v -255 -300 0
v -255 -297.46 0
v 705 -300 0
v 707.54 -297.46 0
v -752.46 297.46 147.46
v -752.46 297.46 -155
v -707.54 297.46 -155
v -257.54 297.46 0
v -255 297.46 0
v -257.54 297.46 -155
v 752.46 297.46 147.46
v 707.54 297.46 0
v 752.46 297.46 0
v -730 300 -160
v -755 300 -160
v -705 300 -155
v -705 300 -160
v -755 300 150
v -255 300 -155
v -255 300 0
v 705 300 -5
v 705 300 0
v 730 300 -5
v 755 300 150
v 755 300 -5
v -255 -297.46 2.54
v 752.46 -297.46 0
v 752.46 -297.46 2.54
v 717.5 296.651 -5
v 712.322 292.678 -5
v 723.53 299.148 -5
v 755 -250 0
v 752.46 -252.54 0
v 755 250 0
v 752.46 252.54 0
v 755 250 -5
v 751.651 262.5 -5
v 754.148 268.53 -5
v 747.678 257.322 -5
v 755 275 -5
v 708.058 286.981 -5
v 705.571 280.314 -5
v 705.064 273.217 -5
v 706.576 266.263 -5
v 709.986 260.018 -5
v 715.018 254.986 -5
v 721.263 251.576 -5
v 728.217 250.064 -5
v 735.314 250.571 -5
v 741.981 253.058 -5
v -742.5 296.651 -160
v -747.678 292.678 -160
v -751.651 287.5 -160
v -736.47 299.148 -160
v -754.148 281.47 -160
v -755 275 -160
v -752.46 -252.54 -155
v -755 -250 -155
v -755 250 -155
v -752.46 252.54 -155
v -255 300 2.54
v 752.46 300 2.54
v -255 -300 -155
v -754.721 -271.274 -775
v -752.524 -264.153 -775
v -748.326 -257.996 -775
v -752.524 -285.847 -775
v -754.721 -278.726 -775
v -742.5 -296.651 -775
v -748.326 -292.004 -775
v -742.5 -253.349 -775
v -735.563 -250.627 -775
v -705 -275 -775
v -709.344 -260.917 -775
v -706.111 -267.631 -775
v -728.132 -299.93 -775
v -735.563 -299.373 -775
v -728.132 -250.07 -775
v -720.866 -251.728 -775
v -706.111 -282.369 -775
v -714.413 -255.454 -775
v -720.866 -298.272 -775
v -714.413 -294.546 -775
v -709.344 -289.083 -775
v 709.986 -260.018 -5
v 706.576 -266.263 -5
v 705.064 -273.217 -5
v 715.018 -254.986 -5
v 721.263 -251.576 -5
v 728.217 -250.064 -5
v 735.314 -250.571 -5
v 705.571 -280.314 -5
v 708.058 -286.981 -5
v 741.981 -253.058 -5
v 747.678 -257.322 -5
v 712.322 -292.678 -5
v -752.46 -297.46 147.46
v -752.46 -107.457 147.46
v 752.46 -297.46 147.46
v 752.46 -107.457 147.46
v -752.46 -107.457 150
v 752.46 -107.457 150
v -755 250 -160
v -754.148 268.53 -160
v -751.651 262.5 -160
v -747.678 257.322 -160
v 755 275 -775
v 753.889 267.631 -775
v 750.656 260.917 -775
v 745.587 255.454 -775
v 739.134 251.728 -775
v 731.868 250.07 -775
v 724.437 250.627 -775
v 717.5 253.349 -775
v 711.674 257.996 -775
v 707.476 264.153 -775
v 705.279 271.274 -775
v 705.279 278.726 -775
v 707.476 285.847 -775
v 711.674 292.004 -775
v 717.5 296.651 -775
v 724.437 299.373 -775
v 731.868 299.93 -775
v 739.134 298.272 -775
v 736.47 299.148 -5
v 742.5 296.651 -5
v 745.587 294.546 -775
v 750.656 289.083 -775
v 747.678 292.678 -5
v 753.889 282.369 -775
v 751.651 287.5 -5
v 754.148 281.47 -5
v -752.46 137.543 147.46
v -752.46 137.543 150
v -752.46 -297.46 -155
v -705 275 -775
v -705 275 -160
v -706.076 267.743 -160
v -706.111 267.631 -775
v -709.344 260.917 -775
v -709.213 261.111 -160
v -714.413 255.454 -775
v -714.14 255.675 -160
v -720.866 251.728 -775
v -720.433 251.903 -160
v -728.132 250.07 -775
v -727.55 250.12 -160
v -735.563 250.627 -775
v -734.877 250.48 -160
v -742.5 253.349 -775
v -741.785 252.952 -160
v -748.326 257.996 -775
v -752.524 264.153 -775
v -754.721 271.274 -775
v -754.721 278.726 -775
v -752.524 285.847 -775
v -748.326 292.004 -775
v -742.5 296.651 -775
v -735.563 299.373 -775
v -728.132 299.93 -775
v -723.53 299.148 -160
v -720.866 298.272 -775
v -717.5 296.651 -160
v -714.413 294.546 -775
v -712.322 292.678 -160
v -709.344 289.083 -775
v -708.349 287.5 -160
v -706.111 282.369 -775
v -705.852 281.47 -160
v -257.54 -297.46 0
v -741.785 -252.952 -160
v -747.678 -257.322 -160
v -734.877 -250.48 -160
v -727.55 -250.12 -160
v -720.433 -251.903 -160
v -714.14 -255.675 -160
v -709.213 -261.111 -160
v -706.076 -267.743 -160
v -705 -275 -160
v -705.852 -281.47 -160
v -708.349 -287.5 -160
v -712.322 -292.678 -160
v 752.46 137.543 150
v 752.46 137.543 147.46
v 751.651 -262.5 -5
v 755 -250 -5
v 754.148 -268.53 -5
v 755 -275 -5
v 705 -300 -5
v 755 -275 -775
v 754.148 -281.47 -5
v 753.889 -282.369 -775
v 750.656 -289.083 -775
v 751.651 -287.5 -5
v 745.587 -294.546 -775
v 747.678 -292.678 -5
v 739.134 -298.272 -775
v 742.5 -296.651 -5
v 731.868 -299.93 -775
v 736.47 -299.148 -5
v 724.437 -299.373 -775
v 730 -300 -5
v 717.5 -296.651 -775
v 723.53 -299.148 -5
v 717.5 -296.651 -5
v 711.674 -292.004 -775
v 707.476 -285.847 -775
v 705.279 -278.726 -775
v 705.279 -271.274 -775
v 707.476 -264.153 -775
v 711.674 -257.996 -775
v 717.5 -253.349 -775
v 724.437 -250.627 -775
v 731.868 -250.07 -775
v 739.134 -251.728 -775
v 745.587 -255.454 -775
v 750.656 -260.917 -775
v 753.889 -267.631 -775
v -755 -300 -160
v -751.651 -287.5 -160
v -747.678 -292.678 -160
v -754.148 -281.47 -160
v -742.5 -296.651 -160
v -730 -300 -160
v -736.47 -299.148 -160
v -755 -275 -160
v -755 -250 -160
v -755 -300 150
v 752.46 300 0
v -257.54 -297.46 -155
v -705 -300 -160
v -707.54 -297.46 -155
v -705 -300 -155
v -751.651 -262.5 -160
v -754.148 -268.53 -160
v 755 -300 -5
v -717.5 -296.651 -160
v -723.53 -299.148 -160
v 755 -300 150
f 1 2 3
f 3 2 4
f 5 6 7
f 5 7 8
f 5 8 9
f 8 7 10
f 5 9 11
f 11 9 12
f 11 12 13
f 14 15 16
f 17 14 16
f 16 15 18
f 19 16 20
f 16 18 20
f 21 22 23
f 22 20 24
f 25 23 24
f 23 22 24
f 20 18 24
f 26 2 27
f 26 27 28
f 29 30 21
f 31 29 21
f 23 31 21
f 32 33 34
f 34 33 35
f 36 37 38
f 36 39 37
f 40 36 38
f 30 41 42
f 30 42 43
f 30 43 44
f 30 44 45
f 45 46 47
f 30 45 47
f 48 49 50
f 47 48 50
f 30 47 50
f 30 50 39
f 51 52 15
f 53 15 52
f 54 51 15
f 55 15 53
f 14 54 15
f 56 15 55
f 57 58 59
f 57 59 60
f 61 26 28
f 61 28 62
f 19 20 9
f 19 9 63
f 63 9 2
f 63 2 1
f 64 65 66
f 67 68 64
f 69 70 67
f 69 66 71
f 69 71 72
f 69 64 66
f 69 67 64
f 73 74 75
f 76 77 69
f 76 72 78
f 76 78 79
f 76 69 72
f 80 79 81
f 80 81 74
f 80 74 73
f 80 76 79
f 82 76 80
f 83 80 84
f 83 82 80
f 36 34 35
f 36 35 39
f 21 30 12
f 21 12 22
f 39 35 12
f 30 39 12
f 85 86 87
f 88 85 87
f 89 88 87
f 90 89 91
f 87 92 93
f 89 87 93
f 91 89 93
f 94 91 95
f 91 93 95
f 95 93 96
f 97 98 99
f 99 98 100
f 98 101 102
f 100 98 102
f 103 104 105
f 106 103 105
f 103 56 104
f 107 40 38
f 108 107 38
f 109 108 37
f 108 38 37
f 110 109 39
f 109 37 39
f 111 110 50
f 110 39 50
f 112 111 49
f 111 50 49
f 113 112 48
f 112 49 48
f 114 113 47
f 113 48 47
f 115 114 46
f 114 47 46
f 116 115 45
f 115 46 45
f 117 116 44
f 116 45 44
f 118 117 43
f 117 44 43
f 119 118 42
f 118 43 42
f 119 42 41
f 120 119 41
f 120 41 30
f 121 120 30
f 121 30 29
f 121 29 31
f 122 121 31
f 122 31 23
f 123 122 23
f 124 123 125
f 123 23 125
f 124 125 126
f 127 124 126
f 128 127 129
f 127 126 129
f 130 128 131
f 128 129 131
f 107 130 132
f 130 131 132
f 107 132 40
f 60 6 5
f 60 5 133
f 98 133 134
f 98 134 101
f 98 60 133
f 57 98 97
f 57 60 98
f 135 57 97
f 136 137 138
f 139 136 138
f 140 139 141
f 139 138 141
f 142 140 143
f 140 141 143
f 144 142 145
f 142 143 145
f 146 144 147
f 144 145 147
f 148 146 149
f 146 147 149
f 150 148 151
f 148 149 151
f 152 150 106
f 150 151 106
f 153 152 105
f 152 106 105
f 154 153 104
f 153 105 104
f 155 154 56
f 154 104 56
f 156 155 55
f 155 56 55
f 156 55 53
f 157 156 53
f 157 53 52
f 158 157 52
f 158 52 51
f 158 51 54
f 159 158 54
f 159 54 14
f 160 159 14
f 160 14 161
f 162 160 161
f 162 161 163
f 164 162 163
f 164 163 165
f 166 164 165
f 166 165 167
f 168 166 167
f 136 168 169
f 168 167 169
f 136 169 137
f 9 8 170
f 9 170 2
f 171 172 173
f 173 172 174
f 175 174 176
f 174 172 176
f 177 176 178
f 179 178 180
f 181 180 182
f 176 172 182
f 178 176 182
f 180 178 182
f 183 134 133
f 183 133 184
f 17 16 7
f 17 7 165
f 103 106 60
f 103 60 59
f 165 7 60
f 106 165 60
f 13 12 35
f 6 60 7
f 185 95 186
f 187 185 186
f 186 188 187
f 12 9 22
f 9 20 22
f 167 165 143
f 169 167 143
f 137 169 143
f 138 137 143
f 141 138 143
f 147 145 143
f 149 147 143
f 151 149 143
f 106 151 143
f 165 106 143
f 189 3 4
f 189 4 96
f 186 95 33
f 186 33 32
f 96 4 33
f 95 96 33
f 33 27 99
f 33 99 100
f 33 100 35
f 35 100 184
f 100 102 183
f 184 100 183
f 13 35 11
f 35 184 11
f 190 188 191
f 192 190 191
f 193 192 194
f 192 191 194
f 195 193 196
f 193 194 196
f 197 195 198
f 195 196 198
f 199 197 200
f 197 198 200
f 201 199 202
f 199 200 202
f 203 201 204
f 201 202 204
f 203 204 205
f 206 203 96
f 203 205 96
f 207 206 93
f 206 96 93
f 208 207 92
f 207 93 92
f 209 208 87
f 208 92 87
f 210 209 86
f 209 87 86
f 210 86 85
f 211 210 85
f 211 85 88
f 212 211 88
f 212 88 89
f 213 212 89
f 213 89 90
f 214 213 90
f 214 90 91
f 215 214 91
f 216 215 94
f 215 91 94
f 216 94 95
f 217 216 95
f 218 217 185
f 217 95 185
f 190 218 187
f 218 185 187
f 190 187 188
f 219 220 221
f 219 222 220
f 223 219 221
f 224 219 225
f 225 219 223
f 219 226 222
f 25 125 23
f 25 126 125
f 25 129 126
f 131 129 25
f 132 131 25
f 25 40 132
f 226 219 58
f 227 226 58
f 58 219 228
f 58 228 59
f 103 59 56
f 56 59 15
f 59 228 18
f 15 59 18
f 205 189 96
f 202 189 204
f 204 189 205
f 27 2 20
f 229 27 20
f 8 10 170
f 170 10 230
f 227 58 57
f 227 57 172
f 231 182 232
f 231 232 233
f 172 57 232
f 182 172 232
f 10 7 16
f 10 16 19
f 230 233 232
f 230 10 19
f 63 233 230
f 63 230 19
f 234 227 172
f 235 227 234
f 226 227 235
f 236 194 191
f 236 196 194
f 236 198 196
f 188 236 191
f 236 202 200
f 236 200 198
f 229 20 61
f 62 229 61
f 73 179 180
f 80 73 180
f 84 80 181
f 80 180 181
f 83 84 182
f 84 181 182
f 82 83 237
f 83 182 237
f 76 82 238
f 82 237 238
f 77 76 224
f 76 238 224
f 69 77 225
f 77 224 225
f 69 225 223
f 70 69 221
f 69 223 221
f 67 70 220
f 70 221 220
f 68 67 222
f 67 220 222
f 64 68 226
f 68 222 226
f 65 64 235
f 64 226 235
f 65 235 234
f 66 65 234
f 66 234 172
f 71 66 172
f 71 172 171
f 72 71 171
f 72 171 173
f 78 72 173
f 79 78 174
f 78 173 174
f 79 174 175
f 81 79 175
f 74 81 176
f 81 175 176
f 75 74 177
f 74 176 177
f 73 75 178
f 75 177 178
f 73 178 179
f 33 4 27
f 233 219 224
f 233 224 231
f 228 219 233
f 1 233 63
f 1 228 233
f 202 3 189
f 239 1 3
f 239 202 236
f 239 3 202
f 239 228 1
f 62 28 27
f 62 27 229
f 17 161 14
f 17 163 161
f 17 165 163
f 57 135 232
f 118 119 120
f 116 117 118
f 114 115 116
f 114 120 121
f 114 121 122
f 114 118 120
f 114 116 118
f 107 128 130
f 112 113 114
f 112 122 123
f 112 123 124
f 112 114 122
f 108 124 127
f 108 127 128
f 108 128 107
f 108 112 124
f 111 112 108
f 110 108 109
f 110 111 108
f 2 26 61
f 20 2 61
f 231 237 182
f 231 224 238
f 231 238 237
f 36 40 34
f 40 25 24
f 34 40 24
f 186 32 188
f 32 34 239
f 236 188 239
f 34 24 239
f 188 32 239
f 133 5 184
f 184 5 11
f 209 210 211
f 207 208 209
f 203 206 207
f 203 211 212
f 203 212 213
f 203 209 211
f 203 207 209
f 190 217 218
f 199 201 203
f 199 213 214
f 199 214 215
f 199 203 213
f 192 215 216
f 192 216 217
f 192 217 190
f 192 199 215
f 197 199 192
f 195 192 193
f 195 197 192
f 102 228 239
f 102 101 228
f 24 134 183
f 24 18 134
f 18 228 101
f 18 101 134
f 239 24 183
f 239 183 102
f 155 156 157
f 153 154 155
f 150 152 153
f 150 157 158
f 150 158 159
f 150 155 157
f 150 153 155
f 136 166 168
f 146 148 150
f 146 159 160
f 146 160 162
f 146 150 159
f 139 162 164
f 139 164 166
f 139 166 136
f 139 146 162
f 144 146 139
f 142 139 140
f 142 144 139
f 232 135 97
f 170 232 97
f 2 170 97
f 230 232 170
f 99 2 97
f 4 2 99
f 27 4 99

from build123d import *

# Parameters (mm, degrees)
F0_W      = 1510
F0_H      = 600
F1_DEPTH  = 150
F2_T      = -2.54
F3_W      = 500
F3_H      = 600
F4_DEPTH  = 155
F5_W      = 494.92
F5_H      = 594.92
F6_DEPTH  = 302.46
F7_W      = 1504.92
F7_H      = 245
F8_DEPTH  = 25.4
F10_DEPTH = 5
F11_R     = 25
F12_DEPTH = 770
F14_DEPTH = 5
F15_R     = 25
F16_DEPTH = 615
F17_W     = 597.46
F17_H     = 2.54
F18_DEPTH = 1007.46


with BuildPart() as f1:
    # F0 (on Top) → F1 (new body)
    with BuildSketch(Plane.XY):
        Rectangle(F0_W, F0_H)
    extrude(amount=F1_DEPTH)

    # F2
    f2_openings = [f1.faces().sort_by_distance(p)[0] for p in [
        (0, 0, 0),
    ]]
    offset(amount=F2_T, openings=f2_openings)

    # F3 (on face) → F4 (join)
    with BuildSketch(Plane(origin=(0, 0, 0), x_dir=(1, 0, 0), z_dir=(0, 0, -1))):
        with Locations((-505, 0)):
            Rectangle(F3_W, F3_H)
    extrude(amount=F4_DEPTH)

    # F5 (on face) → F6 (cut, through all)
    with BuildSketch(Plane(origin=(0, 0, -155), x_dir=(1, 0, 0), z_dir=(0, 0, -1))):
        with Locations((-505, 0)):
            Rectangle(F5_W, F5_H)
    extrude(amount=-F6_DEPTH, mode=Mode.SUBTRACT)

    # F7 (on face) → F8 (cut)
    with BuildSketch(Plane.XY.offset(150)):
        with Locations((0, 15.042861402)):
            Rectangle(F7_W, F7_H)
    extrude(amount=-F8_DEPTH, mode=Mode.SUBTRACT)

    # F9 (on face) → F10 (join)
    with BuildSketch(Plane(origin=(0, 0, 0), x_dir=(1, 0, 0), z_dir=(0, 0, -1))):
        Polygon((705, -300), (755, -300), (755, -250), align=None)
        Polygon((755, 250), (755, 300), (705, 300), align=None)
    extrude(amount=F10_DEPTH)

    # F11 (on face) → F12 (join)
    with BuildSketch(Plane(origin=(0, 0, -5), x_dir=(1, 0, 0), z_dir=(0, 0, -1))):
        with Locations((730, 275)):
            Circle(F11_R)
        with Locations((730, -275)):
            Circle(F11_R)
    extrude(amount=F12_DEPTH)

    # F13 (on face) → F14 (join)
    with BuildSketch(Plane(origin=(0, 0, -155), x_dir=(1, 0, 0), z_dir=(0, 0, -1))):
        Polygon((-755, -250), (-755, -300), (-705, -300), align=None)
        Polygon((-705, 300), (-755, 300), (-755, 250), align=None)
    extrude(amount=F14_DEPTH)

    # F15 (on face) → F16 (join, through all)
    with BuildSketch(Plane(origin=(0, 0, -160), x_dir=(1, 0, 0), z_dir=(0, 0, -1))):
        with Locations((-730, 275)):
            Circle(F15_R)
        with Locations((-730, -275)):
            Circle(F15_R)
    extrude(amount=F16_DEPTH)


with BuildPart() as f18:
    # F17 (on face) → F18 (new body, through all)
    with BuildSketch(Plane.YZ.offset(-255)):
        with Locations((1.27, 1.27)):
            Rectangle(F17_W, F17_H)
    extrude(amount=F18_DEPTH)


solid = Compound([f1.part, f18.part])
